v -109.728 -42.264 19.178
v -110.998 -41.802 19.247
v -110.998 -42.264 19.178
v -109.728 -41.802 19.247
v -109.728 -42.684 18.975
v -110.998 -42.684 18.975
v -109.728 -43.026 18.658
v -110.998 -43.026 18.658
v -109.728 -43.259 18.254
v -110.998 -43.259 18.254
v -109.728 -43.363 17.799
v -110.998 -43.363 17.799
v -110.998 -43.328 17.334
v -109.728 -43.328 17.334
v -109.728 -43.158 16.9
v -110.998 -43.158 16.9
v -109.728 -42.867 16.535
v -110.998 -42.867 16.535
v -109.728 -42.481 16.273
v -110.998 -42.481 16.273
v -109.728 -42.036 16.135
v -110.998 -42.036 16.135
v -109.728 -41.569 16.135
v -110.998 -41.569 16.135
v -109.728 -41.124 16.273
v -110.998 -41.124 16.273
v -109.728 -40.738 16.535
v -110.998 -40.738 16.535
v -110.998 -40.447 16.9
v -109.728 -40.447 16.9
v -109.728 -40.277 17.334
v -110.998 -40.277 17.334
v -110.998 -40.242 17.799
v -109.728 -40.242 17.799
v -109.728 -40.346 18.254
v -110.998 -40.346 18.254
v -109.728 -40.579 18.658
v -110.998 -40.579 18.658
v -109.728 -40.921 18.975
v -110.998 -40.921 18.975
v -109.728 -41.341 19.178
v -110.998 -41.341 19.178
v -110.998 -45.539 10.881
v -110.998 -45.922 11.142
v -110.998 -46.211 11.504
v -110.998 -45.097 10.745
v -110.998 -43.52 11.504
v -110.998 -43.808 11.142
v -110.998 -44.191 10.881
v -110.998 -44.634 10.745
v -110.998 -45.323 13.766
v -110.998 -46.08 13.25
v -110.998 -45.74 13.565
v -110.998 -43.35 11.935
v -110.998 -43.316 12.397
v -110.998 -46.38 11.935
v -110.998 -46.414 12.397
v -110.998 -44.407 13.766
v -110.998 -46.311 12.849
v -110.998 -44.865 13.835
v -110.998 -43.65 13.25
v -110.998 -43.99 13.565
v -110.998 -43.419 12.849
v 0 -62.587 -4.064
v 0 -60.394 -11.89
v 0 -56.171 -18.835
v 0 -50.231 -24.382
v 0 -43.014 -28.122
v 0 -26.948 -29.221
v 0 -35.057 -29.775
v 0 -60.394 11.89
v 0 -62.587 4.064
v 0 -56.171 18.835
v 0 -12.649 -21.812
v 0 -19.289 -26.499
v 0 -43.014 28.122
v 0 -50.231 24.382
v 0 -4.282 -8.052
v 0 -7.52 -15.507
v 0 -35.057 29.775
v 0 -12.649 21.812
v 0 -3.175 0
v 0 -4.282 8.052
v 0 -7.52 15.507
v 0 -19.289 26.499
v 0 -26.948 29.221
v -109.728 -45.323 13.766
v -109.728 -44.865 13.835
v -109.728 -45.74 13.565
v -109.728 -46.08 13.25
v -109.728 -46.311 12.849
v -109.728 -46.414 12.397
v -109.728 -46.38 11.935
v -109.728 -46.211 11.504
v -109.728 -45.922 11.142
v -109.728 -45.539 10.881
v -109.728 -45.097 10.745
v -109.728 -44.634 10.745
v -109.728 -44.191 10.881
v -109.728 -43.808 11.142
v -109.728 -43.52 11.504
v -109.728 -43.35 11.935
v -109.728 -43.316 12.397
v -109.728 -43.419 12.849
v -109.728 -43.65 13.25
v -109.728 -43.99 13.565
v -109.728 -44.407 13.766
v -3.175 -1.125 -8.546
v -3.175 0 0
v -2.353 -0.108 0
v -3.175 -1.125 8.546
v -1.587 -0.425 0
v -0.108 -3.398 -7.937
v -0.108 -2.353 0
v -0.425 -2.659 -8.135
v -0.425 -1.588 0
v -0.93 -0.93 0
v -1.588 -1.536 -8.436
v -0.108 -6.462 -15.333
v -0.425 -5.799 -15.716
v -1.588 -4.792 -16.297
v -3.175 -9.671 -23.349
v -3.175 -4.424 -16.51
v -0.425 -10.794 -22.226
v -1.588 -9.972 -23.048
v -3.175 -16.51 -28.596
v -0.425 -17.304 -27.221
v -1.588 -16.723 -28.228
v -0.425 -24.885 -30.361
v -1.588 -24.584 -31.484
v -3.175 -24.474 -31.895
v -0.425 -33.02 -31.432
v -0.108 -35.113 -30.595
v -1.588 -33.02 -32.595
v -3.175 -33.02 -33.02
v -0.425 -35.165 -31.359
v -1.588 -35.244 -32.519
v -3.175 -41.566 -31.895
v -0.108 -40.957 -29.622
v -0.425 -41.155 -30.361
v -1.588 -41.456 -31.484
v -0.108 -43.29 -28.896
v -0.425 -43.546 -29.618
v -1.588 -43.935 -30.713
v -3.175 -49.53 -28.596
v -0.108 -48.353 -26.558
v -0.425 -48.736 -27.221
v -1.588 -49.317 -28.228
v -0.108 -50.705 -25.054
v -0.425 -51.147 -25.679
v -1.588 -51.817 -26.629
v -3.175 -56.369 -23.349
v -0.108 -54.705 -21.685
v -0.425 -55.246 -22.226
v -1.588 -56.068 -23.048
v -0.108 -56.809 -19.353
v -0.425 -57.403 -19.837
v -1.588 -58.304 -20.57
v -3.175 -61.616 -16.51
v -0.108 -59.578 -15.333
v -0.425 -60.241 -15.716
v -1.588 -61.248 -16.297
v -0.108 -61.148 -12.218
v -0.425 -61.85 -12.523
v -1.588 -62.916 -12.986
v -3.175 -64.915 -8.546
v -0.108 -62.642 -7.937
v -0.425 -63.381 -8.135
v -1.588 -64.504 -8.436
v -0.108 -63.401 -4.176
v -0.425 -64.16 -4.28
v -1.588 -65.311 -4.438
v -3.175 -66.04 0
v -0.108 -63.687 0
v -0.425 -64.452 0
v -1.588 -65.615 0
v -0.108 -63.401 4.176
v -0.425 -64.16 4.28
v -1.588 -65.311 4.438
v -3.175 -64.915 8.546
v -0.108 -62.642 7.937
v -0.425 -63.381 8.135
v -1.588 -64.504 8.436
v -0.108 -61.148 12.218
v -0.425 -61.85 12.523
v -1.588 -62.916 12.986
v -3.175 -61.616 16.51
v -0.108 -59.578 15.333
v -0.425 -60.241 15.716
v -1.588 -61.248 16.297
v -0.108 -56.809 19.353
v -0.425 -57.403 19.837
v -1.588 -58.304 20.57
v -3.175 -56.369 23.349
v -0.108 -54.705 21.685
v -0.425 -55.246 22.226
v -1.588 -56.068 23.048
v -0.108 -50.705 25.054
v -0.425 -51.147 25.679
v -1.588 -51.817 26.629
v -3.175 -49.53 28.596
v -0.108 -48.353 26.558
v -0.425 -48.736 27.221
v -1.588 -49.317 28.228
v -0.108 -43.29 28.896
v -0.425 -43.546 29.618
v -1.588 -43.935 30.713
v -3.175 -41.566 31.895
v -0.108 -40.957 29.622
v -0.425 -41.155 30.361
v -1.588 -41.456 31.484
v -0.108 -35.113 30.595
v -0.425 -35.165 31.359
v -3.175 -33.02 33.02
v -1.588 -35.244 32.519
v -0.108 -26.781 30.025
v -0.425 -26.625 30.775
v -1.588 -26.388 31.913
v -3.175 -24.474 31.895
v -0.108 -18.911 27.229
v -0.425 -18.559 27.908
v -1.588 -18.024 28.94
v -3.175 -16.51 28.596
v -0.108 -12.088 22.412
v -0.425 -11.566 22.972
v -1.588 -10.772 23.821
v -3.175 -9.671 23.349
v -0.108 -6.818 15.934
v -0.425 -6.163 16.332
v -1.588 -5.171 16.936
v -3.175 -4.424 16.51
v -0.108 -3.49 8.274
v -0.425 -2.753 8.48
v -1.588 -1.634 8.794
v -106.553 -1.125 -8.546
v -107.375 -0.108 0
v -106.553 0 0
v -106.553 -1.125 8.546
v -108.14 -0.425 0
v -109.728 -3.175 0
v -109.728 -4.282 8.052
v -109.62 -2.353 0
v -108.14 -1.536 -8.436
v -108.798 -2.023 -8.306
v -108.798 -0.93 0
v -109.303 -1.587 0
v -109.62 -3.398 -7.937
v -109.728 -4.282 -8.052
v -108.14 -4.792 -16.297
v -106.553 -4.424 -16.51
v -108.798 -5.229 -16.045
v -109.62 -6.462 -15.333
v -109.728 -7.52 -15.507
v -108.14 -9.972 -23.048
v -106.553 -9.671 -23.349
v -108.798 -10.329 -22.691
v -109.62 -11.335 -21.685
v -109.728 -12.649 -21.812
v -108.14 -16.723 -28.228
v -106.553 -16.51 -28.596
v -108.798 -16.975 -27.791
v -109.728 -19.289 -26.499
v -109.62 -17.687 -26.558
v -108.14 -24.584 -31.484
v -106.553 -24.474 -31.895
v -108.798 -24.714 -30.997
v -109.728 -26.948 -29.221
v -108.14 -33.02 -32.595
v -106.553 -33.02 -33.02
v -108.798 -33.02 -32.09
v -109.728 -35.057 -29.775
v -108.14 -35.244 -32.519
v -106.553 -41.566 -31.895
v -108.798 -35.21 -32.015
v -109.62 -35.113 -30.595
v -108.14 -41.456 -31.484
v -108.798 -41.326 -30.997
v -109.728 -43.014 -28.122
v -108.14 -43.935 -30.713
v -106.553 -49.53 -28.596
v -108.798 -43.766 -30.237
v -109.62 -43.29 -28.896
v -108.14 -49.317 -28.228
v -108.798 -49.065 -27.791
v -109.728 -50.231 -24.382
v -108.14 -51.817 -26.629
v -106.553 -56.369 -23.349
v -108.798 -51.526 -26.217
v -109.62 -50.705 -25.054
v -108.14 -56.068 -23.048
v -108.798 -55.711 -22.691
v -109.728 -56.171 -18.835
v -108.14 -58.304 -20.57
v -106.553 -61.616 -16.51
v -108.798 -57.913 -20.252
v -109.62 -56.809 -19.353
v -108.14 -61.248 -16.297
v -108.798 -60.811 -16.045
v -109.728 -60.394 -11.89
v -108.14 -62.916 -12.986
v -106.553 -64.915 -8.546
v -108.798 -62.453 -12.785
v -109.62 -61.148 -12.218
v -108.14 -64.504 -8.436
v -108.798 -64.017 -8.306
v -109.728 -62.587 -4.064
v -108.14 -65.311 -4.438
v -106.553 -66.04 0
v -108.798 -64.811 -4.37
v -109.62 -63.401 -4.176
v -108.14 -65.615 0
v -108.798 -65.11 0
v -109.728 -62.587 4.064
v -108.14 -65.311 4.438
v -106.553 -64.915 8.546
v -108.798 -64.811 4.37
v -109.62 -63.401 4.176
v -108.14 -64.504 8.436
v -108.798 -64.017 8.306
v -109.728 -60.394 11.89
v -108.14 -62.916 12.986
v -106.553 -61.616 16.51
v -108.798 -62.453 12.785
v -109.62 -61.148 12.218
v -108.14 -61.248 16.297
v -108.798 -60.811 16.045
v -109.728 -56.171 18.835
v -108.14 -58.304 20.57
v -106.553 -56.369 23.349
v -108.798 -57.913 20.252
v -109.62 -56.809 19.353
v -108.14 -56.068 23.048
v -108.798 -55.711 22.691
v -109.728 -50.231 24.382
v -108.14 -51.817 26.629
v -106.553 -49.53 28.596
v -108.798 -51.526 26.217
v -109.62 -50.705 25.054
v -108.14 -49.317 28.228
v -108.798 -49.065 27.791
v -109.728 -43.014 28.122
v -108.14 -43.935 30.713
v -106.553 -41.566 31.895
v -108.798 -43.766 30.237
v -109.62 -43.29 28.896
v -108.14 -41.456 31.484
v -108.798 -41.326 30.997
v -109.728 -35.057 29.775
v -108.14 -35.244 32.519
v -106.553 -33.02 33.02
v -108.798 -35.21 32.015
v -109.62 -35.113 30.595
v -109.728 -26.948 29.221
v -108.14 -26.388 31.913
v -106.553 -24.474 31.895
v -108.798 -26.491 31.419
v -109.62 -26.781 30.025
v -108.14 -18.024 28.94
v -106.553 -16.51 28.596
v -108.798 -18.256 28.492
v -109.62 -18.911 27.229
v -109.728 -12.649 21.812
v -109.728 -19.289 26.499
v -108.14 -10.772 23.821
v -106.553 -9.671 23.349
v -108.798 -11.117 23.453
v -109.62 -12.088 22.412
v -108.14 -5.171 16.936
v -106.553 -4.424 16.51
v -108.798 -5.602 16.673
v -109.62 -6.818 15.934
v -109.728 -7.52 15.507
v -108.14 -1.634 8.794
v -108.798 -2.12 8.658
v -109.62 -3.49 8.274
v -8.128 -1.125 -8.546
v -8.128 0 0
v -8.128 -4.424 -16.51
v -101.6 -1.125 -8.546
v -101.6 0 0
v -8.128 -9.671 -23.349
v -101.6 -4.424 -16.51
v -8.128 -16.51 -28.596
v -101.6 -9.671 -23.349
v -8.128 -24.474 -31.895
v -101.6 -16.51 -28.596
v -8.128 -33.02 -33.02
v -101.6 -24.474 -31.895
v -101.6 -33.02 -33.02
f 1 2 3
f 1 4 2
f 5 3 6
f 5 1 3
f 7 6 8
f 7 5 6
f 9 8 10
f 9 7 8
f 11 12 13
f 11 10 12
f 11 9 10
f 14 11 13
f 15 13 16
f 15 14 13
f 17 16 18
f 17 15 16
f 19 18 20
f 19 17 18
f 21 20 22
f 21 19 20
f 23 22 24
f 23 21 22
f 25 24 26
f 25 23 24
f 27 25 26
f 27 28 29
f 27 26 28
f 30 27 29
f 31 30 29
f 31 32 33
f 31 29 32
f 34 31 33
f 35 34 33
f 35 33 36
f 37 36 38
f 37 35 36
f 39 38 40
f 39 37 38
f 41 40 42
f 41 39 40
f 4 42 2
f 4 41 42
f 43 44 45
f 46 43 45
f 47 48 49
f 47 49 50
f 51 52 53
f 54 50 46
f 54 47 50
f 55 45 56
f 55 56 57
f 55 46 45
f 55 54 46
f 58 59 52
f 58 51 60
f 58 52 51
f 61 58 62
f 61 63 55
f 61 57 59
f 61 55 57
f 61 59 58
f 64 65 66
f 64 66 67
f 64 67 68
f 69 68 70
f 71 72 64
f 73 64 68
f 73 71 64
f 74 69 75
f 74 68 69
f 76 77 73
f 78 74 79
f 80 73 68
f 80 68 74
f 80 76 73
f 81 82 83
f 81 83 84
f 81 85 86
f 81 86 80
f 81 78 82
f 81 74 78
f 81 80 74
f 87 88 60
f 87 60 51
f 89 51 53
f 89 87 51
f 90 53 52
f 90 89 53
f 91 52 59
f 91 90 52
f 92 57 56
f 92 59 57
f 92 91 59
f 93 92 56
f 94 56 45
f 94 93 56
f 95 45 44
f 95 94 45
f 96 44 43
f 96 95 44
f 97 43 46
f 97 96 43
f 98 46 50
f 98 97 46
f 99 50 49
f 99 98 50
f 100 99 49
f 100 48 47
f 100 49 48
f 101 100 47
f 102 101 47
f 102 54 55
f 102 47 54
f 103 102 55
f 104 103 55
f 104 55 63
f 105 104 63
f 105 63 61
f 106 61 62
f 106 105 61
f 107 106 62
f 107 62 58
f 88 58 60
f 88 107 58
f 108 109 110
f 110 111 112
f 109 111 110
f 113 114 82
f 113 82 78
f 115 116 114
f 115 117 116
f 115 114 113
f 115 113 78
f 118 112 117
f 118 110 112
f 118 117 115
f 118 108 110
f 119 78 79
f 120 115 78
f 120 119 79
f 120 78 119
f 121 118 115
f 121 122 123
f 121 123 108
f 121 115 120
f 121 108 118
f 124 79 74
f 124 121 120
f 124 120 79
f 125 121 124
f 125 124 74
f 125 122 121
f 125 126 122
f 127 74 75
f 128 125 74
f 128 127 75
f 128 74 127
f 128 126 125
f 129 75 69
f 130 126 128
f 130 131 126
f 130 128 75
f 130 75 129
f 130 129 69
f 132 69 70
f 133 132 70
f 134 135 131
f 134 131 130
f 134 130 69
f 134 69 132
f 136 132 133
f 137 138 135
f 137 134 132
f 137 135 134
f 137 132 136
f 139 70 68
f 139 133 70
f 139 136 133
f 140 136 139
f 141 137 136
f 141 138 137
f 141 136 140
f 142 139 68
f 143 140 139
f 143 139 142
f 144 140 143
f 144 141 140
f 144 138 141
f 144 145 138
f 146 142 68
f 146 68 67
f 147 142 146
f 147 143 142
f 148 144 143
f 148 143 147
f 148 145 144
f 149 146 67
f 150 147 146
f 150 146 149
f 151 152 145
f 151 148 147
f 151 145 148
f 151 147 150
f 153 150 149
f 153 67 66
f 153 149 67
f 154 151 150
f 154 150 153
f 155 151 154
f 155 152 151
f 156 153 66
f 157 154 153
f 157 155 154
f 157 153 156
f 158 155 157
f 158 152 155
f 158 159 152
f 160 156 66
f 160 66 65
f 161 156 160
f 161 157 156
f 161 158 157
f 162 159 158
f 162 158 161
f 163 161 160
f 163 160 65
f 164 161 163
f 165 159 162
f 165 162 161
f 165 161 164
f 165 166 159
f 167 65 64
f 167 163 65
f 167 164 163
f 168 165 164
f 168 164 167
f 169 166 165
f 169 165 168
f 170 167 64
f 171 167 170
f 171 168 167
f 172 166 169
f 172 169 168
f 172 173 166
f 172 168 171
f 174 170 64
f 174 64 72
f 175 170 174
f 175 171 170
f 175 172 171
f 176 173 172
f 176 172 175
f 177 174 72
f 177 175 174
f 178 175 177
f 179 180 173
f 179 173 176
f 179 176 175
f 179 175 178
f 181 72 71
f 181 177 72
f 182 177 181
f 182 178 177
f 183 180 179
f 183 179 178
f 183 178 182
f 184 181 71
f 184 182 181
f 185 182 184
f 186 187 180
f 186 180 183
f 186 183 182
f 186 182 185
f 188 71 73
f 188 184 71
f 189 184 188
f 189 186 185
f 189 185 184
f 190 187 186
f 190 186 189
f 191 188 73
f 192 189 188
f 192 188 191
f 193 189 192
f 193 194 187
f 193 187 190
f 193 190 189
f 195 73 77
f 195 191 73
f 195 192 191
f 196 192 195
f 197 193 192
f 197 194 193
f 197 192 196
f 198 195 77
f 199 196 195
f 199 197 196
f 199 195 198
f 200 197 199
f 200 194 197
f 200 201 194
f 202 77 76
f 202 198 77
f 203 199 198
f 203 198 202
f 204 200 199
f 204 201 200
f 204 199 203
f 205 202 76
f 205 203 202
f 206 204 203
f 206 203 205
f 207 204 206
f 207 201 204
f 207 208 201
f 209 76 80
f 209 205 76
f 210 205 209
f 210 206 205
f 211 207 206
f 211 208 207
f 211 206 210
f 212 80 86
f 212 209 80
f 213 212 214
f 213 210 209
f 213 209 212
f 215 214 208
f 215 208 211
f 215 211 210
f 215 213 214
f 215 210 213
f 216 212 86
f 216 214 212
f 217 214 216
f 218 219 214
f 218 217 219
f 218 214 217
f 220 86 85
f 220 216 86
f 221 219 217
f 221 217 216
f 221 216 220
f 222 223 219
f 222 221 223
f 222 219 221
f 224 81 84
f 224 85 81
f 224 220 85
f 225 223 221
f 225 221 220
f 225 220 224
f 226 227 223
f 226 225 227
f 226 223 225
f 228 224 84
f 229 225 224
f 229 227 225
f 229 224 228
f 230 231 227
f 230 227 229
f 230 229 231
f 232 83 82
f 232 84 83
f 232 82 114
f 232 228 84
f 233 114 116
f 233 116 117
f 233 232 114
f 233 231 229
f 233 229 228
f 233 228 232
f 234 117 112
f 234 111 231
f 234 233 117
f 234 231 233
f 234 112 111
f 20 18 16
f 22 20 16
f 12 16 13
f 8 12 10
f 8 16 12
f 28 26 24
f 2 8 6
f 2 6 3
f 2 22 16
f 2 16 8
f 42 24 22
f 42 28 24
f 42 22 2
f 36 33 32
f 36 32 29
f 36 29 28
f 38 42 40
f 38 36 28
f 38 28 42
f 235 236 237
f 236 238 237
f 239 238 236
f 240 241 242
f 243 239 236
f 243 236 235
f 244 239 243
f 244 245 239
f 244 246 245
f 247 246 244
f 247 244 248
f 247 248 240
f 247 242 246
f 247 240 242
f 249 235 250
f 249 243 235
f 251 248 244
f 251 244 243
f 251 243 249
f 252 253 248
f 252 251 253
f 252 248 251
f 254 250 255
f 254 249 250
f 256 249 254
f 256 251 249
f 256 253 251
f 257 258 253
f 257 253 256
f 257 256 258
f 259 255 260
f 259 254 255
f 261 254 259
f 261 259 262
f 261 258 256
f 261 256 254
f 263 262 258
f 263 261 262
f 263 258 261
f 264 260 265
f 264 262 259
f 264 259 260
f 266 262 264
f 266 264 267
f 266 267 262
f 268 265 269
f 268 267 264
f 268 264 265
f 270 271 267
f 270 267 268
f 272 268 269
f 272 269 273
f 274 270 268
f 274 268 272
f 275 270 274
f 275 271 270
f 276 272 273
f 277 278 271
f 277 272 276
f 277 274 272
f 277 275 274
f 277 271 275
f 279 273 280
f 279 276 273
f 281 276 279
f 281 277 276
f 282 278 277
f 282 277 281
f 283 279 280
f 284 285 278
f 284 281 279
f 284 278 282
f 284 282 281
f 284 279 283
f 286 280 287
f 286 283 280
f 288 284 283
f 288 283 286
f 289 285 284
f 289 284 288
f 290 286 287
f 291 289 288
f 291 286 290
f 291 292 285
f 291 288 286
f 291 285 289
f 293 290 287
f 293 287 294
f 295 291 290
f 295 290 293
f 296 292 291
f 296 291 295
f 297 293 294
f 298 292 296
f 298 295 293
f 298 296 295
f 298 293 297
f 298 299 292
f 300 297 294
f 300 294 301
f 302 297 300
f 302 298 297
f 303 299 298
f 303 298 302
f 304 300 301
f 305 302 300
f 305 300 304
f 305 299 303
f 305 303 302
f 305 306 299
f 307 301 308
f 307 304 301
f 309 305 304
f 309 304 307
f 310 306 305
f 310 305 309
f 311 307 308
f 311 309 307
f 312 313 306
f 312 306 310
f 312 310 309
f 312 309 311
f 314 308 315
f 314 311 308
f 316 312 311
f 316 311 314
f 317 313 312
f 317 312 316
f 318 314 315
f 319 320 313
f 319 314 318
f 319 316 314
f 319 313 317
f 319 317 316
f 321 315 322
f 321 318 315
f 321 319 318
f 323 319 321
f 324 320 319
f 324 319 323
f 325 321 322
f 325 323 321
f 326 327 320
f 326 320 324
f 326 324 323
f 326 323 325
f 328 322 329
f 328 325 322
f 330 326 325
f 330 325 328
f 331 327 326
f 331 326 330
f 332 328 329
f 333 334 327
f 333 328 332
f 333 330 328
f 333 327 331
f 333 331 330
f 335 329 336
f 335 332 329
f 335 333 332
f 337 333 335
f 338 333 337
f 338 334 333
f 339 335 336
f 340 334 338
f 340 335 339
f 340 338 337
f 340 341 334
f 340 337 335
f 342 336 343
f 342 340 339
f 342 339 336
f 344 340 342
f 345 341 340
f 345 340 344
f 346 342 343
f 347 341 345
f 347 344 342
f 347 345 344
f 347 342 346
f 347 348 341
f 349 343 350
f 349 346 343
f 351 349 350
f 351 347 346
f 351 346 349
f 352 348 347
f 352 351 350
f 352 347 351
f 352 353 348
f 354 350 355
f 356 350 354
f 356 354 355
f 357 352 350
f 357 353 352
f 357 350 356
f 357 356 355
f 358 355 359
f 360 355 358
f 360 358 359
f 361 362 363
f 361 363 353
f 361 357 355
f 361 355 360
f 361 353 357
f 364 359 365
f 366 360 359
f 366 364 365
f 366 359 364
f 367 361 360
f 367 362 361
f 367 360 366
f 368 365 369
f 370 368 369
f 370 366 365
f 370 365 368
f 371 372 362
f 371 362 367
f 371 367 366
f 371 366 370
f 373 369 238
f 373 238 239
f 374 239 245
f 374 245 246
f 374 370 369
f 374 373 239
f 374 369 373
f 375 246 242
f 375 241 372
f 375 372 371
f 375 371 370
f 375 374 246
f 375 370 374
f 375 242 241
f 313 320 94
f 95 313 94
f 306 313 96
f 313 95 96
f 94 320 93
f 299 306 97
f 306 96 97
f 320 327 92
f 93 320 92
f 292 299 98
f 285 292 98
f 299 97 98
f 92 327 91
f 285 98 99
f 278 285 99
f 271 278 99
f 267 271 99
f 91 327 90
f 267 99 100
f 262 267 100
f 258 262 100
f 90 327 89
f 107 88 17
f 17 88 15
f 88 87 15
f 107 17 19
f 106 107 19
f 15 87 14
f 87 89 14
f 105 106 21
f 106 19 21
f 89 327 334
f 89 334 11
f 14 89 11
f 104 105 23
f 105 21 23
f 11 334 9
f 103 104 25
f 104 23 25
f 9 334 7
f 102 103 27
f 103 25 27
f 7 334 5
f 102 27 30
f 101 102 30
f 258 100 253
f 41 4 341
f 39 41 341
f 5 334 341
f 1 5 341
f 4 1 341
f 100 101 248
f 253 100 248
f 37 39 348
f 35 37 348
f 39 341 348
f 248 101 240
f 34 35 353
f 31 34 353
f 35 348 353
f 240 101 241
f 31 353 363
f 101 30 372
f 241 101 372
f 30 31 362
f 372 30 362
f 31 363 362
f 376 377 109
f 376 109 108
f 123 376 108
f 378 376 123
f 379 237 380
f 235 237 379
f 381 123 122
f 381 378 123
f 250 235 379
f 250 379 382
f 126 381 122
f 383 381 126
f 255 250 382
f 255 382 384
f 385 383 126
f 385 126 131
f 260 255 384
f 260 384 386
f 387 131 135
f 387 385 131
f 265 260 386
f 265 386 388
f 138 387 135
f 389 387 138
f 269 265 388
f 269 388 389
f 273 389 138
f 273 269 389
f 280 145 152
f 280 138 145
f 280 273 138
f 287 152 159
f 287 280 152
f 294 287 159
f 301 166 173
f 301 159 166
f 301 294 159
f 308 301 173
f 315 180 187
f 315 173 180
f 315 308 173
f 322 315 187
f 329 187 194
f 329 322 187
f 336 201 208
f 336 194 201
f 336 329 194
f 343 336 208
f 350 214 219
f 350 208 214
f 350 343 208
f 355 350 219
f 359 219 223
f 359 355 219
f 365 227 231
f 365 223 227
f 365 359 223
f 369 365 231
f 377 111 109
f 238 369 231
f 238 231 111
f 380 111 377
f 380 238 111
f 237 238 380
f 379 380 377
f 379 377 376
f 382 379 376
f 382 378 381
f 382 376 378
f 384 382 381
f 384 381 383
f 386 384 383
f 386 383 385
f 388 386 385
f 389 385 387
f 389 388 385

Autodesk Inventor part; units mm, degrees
ref_plane "YZ Plane" through (0, 0, 0) normal (1, 0, 0) x (0, 1, 0)
ref_plane "XZ Plane" through (0, 0, 0) normal (0, 1, 0) x (-1, 0, 0)
ref_plane "XY Plane" through (0, 0, 0) normal (0, 0, 1) x (1, 0, 0)
sketch "Sketch1" plane through (0, 0, 0) normal (0, 0, 1) x (1, 0, 0)
  line L0 (-106.553, -66.04) -> (-3.175, -66.04)
  line L1 (0, -62.865) -> (0, -3.175)
  line L2 (-3.175, 0) -> (-106.553, 0)
  line L3 (-109.728, -3.175) -> (-109.728, -62.865)
  arc A0 (-106.553, 0) -> (-109.728, -3.175) centre (-106.553, -3.175) ccw
  arc A1 (0, -3.175) -> (-3.175, 0) centre (-3.175, -3.175) ccw
  arc A2 (-3.175, -66.04) -> (0, -62.865) centre (-3.175, -62.865) ccw
  arc A3 (-109.728, -62.865) -> (-106.553, -66.04) centre (-106.553, -62.865) ccw
  line L4 (-101.6, 0) -> (-8.128, 0)
  line L5 (-8.128, 0) -> (-8.128, -66.04)
  line L6 (-8.128, -66.04) -> (-101.6, -66.04)
  line L7 (-101.6, -66.04) -> (-101.6, 0)
  line L8 (-109.728, -33.02) -> (0, -33.02)
  line L9 (-101.6, -33.02) -> (-8.128, -33.02)
  point P0 (0, 0)
  point P1 (0, -66.04)
  point P2 (-109.728, 0)
  dimension "d0" = 109.728
  dimension "d1" = 66.04
  dimension "d2" = 3.175
  dimension "d3" = 93.472
  dimension "d4" = 66.04
revolve "Revolution1" add sketch "Sketch1" angle 360 about axis through (-109.728, -33.02, 0) along (1, 0, 0) contours L8 L3 A0 L2 L7 | L5 L2 A1 L1 L8
sketch "Sketch2" plane through (-101.6, -33.02, 0) normal (1, 0, 0) x (0, 0, -1)
  circle A0 centre (0, 0) radius 33.02 projected
  circle A1 centre (0, 0) radius 33.02
  point P0 (0, 33.02)
extrude "Extrusion1" add sketch "Sketch2" along normal blind 93.6625
sketch "Sketch3" plane through (-109.728, -33.02, 0) normal (-1, 0, 0) x (0, 0, 1)
  circle A0 centre (12.281, -11.8451) radius 1.5537
  circle A1 centre (12.281, -11.8451) radius 3.203
  circle A2 centre (18.9602, -7.3205) radius 1.5537
  circle A3 centre (18.9602, -7.3205) radius 2.8009
  point P0 (0, 33.02)
extrude "Extrusion2" add sketch "Sketch3" along normal blind 1.27 contours A0
sketch "Sketch4" plane through (-109.728, -33.02, 0) normal (-1, 0, 0) x (0, 0, 1)
  circle A0 centre (17.6824, -8.7825) radius 1.5648
  point P0 (0, 33.02)
extrude "Extrusion3" add sketch "Sketch4" along normal blind 1.27
equation "\"BendRadius\" = Thickness"
equation "\"BendReliefWidth\" = Thickness"
equation "\"BendReliefDepth\" = 0.5 * Thickness"
equation "\"CornerReliefSize\" = 4 * Thickness"
equation "\"MinimumRemnant\" = 2 * Thickness"
equation "\"TransitionRadius\" = BendRadius"
equation "\"JacobiRadiusSize\" = BendRadius"
equation "\"GapSize\" = Thickness"
equation "\"Thickness\" = 3.048"
properties part number "cim motor"
